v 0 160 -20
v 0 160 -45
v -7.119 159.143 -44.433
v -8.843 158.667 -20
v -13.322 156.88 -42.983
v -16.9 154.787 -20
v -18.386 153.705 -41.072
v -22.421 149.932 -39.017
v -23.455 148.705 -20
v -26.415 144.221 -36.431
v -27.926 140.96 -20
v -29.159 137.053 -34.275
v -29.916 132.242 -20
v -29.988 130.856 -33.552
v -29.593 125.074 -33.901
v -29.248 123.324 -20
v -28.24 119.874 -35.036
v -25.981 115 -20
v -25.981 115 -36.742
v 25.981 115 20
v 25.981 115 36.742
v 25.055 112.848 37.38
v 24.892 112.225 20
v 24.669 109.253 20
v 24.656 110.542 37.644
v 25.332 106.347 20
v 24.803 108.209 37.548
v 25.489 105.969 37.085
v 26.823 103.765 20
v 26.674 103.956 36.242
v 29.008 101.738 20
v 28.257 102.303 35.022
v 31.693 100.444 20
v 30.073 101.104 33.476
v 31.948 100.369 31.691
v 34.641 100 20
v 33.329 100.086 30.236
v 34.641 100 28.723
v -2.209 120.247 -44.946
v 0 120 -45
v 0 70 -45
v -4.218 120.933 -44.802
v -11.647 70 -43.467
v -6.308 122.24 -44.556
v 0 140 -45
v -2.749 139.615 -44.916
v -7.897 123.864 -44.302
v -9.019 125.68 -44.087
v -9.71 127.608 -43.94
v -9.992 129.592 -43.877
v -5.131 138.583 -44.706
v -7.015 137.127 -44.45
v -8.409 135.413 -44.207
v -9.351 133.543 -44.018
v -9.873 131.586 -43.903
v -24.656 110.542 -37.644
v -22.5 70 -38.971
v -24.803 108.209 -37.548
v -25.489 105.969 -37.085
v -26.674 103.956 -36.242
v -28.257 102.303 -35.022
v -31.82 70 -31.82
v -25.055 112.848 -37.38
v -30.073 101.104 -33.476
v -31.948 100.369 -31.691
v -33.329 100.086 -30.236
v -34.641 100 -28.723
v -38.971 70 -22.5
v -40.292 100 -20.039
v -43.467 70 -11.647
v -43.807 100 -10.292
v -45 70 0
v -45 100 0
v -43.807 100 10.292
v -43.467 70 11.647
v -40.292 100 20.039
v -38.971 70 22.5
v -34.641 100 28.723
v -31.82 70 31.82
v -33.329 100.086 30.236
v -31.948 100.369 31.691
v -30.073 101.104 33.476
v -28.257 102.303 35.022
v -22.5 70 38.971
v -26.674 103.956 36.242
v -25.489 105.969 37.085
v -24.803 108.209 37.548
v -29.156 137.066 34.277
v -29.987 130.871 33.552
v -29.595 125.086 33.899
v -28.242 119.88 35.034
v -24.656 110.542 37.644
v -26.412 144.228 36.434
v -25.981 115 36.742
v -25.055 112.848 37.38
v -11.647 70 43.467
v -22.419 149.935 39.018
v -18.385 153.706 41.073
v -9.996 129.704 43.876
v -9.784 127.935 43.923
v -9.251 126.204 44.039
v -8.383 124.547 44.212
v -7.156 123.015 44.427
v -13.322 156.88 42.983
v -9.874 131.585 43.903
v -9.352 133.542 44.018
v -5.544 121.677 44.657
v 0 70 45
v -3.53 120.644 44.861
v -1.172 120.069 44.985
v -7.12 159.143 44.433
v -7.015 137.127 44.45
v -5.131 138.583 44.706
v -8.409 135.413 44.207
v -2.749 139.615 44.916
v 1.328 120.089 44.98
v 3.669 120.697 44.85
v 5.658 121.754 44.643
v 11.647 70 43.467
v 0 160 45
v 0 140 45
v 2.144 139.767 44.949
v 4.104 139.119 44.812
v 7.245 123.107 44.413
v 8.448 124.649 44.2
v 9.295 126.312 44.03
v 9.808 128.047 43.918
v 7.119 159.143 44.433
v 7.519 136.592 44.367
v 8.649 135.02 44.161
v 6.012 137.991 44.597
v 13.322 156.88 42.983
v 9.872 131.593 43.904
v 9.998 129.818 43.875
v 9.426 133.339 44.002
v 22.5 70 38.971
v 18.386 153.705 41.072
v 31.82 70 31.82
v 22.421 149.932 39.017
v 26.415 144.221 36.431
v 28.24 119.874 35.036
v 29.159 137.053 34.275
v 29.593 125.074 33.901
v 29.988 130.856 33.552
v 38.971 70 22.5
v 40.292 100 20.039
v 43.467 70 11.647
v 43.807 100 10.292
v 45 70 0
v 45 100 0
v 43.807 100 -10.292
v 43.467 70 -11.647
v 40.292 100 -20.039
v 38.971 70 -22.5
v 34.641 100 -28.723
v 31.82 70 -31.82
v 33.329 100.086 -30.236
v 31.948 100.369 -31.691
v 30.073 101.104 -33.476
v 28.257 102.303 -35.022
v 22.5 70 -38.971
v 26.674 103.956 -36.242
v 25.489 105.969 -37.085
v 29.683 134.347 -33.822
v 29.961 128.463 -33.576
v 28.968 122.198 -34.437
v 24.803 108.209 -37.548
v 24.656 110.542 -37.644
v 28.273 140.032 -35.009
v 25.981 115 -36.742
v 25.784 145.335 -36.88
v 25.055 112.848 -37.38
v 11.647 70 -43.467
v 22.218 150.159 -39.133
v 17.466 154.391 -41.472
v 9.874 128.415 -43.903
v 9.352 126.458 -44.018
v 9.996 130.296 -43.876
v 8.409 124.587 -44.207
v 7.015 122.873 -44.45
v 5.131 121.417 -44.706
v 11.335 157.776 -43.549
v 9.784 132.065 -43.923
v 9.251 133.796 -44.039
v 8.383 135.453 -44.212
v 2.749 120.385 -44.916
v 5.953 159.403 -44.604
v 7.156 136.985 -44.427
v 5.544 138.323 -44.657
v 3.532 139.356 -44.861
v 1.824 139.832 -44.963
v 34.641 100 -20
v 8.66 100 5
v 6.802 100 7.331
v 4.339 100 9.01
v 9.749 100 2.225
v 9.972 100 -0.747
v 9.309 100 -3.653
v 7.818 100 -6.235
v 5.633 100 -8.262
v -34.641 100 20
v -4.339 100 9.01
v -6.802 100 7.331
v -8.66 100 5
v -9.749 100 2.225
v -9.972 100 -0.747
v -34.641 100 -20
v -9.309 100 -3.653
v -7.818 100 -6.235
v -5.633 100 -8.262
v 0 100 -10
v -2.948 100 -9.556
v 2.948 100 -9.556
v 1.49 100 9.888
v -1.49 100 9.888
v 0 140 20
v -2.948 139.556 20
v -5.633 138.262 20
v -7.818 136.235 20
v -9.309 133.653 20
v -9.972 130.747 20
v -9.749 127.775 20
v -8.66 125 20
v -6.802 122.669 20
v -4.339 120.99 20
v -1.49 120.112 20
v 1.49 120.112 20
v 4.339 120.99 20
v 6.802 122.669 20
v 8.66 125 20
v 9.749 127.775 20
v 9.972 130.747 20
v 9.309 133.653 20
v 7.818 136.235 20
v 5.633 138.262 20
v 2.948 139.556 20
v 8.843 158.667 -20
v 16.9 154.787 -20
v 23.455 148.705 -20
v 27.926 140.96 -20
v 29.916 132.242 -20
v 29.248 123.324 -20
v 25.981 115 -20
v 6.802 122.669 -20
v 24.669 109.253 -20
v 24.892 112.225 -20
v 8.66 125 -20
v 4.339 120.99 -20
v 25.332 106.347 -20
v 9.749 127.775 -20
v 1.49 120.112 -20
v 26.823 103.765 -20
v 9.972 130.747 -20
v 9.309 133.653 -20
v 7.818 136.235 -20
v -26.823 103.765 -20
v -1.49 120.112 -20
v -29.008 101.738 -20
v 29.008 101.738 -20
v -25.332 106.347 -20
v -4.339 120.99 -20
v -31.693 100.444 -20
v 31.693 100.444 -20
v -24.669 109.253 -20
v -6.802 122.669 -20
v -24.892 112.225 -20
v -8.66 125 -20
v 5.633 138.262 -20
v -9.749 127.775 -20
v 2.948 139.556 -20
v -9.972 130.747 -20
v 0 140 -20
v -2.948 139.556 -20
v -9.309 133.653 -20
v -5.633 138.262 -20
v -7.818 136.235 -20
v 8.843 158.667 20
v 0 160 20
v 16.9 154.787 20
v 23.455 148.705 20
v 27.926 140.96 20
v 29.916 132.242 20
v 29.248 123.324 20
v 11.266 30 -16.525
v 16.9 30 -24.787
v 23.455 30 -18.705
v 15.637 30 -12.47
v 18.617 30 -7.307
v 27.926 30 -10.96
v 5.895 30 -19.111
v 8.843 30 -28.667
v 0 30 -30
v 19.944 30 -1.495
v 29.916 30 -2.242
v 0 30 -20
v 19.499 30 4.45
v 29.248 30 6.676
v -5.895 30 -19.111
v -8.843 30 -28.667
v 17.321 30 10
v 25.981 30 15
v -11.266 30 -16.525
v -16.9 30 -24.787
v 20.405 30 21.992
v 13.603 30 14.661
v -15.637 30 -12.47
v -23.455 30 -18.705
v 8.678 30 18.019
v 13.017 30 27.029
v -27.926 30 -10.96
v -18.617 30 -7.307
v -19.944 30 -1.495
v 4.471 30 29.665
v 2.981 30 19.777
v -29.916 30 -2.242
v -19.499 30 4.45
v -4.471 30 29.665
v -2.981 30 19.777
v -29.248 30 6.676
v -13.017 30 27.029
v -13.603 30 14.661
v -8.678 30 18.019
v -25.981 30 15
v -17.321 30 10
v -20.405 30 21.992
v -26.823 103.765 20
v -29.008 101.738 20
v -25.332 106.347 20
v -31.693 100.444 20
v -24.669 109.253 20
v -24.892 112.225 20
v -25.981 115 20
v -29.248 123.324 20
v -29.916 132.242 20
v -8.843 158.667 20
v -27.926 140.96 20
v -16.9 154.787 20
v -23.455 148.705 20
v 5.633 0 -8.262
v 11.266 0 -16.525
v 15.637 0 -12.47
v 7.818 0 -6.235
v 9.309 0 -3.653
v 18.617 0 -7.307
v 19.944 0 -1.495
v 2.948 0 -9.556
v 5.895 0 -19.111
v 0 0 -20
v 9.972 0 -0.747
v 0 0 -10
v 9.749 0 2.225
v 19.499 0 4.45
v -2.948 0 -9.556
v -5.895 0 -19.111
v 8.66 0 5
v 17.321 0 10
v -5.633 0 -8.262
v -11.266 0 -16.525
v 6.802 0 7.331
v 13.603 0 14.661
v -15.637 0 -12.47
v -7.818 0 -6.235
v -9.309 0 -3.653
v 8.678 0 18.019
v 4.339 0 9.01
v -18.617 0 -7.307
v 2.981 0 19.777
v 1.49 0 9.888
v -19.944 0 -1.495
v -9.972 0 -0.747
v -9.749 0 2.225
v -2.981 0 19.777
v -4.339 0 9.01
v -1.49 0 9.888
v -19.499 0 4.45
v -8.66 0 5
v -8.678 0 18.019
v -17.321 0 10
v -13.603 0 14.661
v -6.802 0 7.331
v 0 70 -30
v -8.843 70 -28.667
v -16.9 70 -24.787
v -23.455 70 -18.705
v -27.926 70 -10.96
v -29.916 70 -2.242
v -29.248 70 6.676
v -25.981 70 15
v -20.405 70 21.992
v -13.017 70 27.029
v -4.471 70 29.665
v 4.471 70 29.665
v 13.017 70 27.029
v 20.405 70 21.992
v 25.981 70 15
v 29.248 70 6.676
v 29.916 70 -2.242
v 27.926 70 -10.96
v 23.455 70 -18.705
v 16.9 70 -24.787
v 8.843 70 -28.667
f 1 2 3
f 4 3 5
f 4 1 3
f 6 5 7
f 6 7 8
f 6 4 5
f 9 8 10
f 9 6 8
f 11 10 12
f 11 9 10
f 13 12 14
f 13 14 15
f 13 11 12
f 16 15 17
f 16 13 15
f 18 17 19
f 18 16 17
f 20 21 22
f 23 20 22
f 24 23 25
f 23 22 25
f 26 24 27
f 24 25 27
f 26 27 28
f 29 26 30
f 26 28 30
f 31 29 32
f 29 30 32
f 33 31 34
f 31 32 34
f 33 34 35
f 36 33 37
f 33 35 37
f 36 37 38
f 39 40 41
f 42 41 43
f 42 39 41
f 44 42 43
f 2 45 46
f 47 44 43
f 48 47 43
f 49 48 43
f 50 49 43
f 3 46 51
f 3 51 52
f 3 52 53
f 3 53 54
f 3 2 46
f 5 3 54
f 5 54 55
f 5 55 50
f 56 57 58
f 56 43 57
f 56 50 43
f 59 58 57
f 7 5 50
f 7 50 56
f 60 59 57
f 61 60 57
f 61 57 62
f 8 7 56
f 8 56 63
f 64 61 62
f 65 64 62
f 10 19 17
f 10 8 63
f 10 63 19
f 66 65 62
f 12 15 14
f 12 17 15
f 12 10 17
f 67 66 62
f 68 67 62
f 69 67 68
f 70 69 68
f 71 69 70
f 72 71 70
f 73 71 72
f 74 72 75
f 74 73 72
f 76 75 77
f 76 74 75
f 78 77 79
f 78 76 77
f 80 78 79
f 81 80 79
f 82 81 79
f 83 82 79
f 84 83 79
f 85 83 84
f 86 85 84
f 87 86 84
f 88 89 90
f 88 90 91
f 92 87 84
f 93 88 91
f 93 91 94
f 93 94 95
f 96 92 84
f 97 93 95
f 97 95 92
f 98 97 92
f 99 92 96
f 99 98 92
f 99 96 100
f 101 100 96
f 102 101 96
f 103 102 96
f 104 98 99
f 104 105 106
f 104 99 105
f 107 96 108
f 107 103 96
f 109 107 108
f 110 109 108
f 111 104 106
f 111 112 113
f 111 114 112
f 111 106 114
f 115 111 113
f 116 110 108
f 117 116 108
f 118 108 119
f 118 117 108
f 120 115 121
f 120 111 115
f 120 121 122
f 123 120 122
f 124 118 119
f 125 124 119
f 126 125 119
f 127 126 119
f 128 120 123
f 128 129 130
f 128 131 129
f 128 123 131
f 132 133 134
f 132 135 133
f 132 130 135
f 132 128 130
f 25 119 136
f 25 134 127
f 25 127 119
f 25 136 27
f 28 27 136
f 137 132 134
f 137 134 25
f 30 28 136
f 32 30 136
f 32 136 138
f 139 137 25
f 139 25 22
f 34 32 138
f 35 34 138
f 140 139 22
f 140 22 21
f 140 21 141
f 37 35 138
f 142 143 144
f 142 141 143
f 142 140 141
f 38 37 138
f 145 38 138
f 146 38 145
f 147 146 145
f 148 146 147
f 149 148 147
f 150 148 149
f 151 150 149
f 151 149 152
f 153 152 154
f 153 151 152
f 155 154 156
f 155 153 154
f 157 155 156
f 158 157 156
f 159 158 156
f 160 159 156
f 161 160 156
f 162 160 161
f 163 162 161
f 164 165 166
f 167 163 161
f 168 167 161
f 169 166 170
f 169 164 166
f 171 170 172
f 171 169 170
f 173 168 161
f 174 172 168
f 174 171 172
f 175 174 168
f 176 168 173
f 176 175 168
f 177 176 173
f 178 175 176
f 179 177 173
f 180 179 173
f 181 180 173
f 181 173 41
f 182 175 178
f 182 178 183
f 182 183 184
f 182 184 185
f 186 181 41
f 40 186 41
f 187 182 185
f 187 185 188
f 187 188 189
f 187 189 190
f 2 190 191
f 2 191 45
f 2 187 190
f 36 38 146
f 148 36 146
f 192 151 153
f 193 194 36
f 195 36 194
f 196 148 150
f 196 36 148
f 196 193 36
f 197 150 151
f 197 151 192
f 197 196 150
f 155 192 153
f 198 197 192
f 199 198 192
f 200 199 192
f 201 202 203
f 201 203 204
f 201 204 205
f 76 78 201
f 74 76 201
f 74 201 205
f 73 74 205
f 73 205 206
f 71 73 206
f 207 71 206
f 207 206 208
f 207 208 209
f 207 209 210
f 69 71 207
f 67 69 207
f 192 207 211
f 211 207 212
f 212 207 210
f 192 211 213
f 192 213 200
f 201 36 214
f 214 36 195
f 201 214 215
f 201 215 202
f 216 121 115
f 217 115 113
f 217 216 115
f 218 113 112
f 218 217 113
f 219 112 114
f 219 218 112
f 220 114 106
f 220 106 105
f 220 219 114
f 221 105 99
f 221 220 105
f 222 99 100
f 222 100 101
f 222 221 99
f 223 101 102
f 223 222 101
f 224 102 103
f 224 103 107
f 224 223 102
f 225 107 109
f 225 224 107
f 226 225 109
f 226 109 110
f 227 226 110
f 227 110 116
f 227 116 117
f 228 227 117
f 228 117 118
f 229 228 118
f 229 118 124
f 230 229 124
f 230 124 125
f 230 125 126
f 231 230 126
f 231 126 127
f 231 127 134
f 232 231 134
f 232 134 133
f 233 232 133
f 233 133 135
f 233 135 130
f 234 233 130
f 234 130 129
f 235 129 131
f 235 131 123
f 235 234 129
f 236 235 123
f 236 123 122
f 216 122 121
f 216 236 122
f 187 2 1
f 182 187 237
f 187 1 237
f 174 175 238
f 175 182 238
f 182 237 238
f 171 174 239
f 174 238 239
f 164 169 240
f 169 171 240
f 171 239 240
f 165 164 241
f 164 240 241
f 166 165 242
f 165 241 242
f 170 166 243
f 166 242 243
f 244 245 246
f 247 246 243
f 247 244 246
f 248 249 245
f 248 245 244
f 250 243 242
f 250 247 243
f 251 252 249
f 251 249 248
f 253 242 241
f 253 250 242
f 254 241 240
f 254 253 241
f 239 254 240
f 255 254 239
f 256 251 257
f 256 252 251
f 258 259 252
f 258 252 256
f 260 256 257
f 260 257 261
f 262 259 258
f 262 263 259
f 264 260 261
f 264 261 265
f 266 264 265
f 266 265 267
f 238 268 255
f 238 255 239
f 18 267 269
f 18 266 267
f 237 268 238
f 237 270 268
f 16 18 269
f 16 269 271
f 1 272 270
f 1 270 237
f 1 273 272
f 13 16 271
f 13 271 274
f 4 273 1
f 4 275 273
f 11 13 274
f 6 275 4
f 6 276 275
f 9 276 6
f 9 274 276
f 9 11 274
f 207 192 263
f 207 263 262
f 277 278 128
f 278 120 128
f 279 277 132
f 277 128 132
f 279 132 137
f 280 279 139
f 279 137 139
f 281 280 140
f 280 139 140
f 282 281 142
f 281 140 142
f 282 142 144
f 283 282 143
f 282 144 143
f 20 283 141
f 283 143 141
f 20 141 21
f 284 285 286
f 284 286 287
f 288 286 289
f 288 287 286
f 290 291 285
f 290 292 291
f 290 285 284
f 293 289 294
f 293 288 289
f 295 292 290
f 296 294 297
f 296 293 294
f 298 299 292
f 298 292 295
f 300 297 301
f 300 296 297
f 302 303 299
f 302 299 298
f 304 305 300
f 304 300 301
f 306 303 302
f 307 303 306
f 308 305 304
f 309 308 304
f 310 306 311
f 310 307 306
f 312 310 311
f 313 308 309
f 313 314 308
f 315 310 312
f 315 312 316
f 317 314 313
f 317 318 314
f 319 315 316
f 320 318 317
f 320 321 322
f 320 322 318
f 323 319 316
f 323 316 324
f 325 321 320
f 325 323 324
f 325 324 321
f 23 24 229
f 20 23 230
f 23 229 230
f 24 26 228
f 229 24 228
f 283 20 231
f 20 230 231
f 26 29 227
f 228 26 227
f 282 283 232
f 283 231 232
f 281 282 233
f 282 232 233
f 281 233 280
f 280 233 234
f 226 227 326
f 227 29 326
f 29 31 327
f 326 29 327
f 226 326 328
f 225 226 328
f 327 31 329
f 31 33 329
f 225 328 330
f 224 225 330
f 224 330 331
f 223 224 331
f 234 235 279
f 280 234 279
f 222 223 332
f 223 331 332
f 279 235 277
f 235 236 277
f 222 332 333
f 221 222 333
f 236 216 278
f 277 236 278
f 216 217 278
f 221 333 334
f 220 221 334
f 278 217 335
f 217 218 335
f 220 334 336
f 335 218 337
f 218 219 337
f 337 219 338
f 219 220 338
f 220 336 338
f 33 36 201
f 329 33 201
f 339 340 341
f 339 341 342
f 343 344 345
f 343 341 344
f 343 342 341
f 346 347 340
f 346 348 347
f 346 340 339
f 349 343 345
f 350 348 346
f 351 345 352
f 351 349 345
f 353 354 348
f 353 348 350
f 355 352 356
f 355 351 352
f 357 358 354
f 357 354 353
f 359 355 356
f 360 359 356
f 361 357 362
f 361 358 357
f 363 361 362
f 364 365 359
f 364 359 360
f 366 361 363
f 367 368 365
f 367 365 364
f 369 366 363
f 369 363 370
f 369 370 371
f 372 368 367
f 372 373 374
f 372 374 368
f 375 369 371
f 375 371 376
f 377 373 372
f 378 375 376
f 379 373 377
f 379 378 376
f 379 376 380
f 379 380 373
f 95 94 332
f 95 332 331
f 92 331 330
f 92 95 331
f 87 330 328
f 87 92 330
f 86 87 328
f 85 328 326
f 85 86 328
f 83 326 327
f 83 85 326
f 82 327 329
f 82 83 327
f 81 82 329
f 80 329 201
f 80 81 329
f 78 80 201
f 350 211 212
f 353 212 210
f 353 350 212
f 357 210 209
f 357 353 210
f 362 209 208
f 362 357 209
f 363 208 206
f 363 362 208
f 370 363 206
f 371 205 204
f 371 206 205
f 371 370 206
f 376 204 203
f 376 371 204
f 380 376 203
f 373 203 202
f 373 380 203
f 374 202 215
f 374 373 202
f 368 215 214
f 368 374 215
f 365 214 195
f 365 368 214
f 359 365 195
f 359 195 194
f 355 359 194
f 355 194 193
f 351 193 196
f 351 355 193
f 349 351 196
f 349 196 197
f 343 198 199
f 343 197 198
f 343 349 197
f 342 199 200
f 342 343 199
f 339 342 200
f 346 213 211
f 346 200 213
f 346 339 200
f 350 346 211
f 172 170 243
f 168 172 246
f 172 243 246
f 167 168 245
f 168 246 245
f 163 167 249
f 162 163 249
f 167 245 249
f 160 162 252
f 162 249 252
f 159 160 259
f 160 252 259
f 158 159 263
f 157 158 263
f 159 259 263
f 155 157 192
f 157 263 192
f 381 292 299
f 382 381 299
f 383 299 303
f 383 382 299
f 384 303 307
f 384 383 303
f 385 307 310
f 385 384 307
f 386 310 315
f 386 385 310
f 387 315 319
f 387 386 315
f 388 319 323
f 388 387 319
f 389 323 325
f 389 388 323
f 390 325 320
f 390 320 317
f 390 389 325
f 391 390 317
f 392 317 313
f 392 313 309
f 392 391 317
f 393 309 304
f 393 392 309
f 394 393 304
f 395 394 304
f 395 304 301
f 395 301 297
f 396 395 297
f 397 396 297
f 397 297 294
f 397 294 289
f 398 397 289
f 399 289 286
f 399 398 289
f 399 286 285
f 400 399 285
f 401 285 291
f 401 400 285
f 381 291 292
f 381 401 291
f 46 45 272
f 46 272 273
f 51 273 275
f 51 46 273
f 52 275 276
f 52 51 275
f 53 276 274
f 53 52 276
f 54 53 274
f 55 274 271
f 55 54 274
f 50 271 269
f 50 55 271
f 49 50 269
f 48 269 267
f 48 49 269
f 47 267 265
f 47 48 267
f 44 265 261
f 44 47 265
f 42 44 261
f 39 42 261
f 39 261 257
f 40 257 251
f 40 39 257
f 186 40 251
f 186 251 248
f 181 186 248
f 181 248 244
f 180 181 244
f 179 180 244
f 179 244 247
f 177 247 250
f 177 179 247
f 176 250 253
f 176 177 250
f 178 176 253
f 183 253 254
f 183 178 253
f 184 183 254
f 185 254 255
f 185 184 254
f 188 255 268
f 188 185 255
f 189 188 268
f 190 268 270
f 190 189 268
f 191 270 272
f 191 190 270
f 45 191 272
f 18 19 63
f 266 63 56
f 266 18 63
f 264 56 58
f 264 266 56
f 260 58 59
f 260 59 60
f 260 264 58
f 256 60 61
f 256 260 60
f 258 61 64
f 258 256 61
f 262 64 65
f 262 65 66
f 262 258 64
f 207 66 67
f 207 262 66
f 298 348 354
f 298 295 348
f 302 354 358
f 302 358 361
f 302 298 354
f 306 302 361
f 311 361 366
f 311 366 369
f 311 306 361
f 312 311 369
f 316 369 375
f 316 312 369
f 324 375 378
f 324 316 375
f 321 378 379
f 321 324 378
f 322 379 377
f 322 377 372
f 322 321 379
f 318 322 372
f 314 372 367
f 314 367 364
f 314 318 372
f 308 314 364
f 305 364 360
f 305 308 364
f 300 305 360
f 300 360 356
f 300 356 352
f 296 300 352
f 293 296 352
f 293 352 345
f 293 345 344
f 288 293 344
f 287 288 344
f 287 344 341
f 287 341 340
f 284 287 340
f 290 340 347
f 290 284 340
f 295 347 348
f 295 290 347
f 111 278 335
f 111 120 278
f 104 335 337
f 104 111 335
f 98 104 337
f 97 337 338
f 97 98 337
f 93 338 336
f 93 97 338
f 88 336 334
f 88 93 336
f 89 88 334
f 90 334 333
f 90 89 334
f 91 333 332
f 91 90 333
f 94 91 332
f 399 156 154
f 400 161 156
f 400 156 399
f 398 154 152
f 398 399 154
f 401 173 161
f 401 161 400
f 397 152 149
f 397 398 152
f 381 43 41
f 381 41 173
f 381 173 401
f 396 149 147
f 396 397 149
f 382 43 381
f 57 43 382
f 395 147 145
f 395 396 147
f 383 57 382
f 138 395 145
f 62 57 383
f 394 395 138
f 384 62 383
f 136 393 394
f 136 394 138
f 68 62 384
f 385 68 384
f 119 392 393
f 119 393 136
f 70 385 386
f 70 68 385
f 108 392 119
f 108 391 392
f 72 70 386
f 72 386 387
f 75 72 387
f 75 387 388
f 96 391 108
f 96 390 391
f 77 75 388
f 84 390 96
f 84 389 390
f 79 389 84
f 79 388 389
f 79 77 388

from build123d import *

# Parameters (mm, degrees)
CUT_EXTRUDE1_DEPTH      = 173.191753577
CUT_EXTRUDE2_DEPTH      = 173.191753722
CUT_EXTRUDE2_DEPTH_BACK = 173.191753722
SKETCH3_W               = 40
SKETCH3_H               = 60
CUT_EXTRUDE3_DEPTH      = 173.191753722
CUT_EXTRUDE3_DEPTH_BACK = 173.191753722
SKETCH5_R               = 10


with BuildPart() as part:
    # Sketch1 → Revolve1 (revolve)
    with BuildSketch(Plane.XY, mode=Mode.PRIVATE) as revolve1_sk:
        Polygon((10, 0), (20, 0), (20, 30), (30, 30), (30, 70), (45, 70), (45, 160), (10, 160), align=None)
    revolve(revolve1_sk.sketch.rotate(Axis((0, 0, 0), (0, 1, 0)), 90), axis=Axis((0, 0, 0), (0, 1, 0)))

    # Sketch2 → Cut-Extrude1 (cut, symmetric)
    with BuildSketch(Plane.XY):
        with BuildLine():
            Line((-34.641016151, 100), (-50, 100))
            Line((-50, 100), (-50, 160))
            Line((-50, 160), (0, 160))
            ThreePointArc((0, 160), (-25.980762114, 145), (-25.980762114, 115))
            ThreePointArc((-25.980762114, 115), (-25.980762114, 105), (-34.641016151, 100))
        make_face()
    cut_extrude1 = extrude(amount=CUT_EXTRUDE1_DEPTH, both=True, mode=Mode.SUBTRACT)

    # Mirror1: Cut-Extrude1 across plane
    add(cut_extrude1.mirror(Plane(origin=(0, 0, 0), x_dir=(0, 0, 1), z_dir=(1, 0, 0))), mode=Mode.SUBTRACT)

    # Sketch3 → Cut-Extrude2 (cut, two sides: drawn at the far end of the back side and taken through both)
    with BuildSketch(Plane(origin=(0, 0, 0), x_dir=(0, 0, -1), z_dir=(1, 0, 0)).offset(-CUT_EXTRUDE2_DEPTH_BACK)):
        with Locations((0, 130)):
            Rectangle(SKETCH3_W, SKETCH3_H)
    extrude(amount=CUT_EXTRUDE2_DEPTH + CUT_EXTRUDE2_DEPTH_BACK, mode=Mode.SUBTRACT)

    # Sketch5 → Cut-Extrude3 (cut, two sides: drawn at the far end of the back side and taken through both)
    with BuildSketch(Plane.XY.offset(-CUT_EXTRUDE3_DEPTH_BACK)):
        with Locations(Location((0, 130, 0), (0, 0, 90))):
            Circle(SKETCH5_R)
    extrude(amount=CUT_EXTRUDE3_DEPTH + CUT_EXTRUDE3_DEPTH_BACK, mode=Mode.SUBTRACT)


solid = part.part
